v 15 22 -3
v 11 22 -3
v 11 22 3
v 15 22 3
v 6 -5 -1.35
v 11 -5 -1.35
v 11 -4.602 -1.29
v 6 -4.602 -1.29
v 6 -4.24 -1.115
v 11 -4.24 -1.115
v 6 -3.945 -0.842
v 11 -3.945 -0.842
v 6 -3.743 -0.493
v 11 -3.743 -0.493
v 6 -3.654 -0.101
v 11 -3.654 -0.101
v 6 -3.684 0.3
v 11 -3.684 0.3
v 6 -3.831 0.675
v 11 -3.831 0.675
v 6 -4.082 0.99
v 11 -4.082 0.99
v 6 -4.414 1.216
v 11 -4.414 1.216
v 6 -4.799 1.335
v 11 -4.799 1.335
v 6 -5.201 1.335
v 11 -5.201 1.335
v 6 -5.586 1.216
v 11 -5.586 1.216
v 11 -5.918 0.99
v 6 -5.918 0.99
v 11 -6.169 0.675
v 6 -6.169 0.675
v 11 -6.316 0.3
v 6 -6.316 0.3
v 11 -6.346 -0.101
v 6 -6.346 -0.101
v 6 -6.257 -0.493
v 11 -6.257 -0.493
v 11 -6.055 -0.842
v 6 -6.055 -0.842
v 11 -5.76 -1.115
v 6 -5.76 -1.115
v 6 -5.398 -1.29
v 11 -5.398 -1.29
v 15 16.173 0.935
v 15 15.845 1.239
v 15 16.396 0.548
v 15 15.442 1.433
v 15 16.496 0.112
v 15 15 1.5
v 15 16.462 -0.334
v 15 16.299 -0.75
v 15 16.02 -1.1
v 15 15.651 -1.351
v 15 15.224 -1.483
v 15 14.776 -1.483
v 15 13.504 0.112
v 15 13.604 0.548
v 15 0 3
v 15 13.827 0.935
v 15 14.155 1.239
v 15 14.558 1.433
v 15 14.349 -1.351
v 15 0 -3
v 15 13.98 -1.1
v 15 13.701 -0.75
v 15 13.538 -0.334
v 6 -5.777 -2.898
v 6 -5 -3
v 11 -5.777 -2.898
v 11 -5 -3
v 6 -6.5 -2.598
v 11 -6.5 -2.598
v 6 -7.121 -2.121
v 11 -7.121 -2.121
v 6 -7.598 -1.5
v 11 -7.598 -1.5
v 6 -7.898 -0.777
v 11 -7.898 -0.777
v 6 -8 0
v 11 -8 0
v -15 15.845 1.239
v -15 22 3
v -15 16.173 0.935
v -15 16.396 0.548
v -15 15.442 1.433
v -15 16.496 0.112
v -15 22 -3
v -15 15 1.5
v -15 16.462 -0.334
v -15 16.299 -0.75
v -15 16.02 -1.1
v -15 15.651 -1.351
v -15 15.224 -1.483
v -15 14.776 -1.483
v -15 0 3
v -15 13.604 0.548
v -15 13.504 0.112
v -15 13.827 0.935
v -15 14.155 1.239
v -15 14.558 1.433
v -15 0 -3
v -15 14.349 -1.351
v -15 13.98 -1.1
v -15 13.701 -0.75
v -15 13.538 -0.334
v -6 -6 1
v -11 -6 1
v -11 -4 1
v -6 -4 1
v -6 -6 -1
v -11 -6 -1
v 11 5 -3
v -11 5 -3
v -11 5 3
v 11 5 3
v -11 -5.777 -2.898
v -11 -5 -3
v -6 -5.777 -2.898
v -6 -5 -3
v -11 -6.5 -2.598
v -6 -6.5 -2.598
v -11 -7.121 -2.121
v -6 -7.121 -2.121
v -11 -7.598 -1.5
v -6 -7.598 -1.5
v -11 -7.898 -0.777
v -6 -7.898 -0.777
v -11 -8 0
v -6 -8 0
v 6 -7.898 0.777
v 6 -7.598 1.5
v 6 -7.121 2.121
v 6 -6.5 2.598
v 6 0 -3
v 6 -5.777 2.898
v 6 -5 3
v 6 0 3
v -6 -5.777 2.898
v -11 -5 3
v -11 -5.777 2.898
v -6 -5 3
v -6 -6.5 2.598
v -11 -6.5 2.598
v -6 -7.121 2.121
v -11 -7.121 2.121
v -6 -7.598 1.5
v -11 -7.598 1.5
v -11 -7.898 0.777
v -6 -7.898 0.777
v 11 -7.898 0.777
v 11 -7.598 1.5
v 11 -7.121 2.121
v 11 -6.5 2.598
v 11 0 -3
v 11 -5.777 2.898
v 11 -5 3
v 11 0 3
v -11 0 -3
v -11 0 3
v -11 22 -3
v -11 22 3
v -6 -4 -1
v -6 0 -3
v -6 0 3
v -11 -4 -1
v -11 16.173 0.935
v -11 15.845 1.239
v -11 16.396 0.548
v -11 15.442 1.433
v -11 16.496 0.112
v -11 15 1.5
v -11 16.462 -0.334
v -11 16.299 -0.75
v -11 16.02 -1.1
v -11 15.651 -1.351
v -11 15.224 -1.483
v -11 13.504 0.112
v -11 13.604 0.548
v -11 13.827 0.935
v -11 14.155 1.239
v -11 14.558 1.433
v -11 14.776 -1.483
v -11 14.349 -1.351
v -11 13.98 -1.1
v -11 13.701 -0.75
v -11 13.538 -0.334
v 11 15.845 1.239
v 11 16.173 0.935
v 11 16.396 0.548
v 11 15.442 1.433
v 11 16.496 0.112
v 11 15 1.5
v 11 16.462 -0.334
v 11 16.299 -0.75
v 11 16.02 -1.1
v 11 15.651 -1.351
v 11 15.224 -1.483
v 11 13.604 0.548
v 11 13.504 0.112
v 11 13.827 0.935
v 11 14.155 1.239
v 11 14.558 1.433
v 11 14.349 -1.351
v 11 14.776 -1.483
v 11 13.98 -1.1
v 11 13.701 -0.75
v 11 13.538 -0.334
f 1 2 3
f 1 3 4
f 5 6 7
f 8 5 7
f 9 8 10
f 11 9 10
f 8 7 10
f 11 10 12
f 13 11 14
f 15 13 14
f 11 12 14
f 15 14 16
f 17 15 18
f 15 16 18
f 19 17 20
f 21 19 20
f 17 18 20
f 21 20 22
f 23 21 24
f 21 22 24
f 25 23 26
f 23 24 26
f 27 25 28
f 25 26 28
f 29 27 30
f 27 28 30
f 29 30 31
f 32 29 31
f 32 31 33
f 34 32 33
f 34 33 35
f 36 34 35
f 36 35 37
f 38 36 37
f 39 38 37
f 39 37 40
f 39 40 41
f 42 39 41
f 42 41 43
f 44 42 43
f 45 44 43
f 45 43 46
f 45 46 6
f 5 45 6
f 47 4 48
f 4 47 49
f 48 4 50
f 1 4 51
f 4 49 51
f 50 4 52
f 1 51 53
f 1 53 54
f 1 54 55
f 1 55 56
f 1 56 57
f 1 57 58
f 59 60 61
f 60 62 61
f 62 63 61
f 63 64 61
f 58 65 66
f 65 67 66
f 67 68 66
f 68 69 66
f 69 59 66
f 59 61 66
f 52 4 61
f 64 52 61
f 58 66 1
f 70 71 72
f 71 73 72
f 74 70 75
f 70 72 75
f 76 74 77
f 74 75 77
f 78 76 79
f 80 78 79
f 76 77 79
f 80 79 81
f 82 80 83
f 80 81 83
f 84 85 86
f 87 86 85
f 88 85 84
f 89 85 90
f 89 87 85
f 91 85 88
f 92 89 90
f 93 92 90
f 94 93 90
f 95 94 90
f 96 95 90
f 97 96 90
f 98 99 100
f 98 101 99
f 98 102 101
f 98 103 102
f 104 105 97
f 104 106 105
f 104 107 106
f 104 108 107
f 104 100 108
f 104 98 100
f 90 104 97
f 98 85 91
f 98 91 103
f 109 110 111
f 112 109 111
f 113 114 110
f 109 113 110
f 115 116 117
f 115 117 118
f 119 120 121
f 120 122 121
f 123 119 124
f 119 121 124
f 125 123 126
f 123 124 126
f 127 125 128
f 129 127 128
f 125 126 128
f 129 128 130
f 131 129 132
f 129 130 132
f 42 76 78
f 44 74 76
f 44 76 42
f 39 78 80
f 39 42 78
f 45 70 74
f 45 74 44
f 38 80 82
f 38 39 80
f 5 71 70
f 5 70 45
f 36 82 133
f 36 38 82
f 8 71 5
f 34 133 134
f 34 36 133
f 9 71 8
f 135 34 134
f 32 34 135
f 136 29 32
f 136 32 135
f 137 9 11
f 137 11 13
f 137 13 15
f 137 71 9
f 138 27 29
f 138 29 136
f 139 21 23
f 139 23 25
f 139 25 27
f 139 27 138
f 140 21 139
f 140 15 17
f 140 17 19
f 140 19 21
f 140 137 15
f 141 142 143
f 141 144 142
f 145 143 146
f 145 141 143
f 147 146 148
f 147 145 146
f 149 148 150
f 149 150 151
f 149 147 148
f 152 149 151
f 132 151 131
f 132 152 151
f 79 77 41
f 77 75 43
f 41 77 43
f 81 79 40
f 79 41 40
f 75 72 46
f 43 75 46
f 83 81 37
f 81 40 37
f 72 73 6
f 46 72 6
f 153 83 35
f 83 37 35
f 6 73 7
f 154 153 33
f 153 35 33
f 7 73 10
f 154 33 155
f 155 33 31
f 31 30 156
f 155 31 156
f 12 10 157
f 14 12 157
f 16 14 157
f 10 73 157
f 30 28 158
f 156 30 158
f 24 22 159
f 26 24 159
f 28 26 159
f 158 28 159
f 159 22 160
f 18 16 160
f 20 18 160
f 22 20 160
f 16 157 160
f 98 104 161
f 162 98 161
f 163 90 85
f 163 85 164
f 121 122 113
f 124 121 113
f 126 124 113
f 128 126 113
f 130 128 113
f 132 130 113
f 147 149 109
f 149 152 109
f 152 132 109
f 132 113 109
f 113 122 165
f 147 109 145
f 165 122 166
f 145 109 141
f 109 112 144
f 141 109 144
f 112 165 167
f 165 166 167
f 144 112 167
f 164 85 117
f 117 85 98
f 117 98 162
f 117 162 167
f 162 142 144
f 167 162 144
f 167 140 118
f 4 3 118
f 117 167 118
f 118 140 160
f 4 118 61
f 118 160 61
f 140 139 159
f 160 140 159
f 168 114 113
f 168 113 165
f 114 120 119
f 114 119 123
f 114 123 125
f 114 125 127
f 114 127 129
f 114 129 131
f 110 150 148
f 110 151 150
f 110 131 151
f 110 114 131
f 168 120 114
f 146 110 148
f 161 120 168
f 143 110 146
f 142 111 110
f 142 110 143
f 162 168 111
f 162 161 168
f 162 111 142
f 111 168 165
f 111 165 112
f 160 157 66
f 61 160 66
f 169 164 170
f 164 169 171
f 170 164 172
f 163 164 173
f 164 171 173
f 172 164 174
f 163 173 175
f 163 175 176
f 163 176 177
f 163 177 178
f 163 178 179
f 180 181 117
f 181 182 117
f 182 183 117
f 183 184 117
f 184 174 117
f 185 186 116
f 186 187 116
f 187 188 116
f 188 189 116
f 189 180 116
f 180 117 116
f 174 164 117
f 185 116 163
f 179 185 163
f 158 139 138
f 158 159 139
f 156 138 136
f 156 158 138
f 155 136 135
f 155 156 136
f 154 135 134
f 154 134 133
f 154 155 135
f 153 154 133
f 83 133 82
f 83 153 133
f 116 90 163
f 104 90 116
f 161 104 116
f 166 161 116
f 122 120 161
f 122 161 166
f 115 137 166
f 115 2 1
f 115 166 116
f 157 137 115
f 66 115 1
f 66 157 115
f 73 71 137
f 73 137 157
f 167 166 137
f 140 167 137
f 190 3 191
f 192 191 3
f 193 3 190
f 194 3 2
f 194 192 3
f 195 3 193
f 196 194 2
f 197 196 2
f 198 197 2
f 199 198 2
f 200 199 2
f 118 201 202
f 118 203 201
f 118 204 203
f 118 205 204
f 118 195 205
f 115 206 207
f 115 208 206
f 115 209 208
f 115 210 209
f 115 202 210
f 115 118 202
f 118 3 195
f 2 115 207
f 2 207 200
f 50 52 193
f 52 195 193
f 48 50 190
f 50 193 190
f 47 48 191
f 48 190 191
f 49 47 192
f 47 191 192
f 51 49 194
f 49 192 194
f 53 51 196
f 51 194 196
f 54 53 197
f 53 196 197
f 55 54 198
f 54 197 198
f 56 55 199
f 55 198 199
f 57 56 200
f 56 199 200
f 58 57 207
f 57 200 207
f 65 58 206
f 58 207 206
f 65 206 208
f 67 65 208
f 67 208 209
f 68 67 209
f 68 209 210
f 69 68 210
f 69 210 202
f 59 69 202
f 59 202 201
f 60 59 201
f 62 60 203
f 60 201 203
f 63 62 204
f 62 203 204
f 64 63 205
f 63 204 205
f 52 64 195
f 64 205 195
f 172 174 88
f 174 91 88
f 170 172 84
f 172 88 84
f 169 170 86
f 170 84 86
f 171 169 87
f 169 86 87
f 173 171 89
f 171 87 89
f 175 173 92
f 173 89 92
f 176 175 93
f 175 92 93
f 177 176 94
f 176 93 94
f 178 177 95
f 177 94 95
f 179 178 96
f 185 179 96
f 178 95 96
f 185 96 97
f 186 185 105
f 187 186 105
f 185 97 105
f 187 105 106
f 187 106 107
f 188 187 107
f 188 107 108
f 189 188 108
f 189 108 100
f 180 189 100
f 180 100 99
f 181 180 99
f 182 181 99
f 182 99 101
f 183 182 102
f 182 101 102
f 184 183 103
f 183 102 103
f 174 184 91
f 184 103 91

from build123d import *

# Parameters (mm, degrees)
SKETCH3_W           = 30
SKETCH3_H           = 6
BOSS_EXTRUDE2_DEPTH = 5
SKETCH4_W           = 4
SKETCH4_H           = 6
BOSS_EXTRUDE3_DEPTH = 17
SKETCH7_R           = 1.5
CUT_EXTRUDE2_DEPTH  = 50
SKETCH9_W           = 5
SKETCH9_H           = 6
BOSS_EXTRUDE5_DEPTH = 8
SKETCH10_R          = 1.35
CUT_EXTRUDE3_DEPTH  = 8
SKETCH11_W          = 2
SKETCH11_H          = 2
CUT_EXTRUDE4_DEPTH  = 8
FILLET2_R           = 3


with BuildPart() as part:
    # Sketch3 → Boss-Extrude2 (new body)
    with BuildSketch(Plane(origin=(0, 0, 0), x_dir=(1, 0, 0), z_dir=(0, 1, 0))):
        Rectangle(SKETCH3_W, SKETCH3_H)
    extrude(amount=BOSS_EXTRUDE2_DEPTH)

    # Sketch4 → Boss-Extrude3 (add)
    with BuildSketch(Plane(origin=(0, 5, 0), x_dir=(1, 0, 0), z_dir=(0, 1, 0))):
        with Locations((-13, 0)):
            Rectangle(SKETCH4_W, SKETCH4_H)
        with Locations((13, 0)):
            Rectangle(SKETCH4_W, SKETCH4_H)
    extrude(amount=BOSS_EXTRUDE3_DEPTH)

    # Sketch7 → Cut-Extrude2 (cut, symmetric)
    with BuildSketch(Plane.ZY.offset(-11)):
        with Locations((0, 15)):
            Circle(SKETCH7_R)
    extrude(amount=CUT_EXTRUDE2_DEPTH, both=True, mode=Mode.SUBTRACT)

    # Sketch9 → Boss-Extrude5 (add)
    with BuildSketch(Plane.XZ):
        with Locations((-8.5, 0)):
            Rectangle(SKETCH9_W, SKETCH9_H)
        with Locations((8.5, 0)):
            Rectangle(SKETCH9_W, SKETCH9_H)
    extrude(amount=BOSS_EXTRUDE5_DEPTH)

    # Sketch10 → Cut-Extrude3 (cut)
    with BuildSketch(Plane(origin=(11, 0, 0), x_dir=(0, 0, -1), z_dir=(1, 0, 0))):
        with Locations((0, -5)):
            Circle(SKETCH10_R)
    extrude(amount=-CUT_EXTRUDE3_DEPTH, mode=Mode.SUBTRACT)

    # Sketch11 → Cut-Extrude4 (cut)
    with BuildSketch(Plane.ZY.offset(11)):
        with Locations((0, -5)):
            Rectangle(SKETCH11_W, SKETCH11_H)
    extrude(amount=-CUT_EXTRUDE4_DEPTH, mode=Mode.SUBTRACT)

    # Fillet2
    fillet2_edges = [part.edges().sort_by_distance(p)[0] for p in [
        (-8.5, -8, -3),
        (8.5, -8, -3),
        (8.5, -8, 3),
        (-8.5, -8, 3),
    ]]
    fillet(fillet2_edges, radius=FILLET2_R - 0.0001)  # a hair under: the kernel refuses the full size


solid = part.part
